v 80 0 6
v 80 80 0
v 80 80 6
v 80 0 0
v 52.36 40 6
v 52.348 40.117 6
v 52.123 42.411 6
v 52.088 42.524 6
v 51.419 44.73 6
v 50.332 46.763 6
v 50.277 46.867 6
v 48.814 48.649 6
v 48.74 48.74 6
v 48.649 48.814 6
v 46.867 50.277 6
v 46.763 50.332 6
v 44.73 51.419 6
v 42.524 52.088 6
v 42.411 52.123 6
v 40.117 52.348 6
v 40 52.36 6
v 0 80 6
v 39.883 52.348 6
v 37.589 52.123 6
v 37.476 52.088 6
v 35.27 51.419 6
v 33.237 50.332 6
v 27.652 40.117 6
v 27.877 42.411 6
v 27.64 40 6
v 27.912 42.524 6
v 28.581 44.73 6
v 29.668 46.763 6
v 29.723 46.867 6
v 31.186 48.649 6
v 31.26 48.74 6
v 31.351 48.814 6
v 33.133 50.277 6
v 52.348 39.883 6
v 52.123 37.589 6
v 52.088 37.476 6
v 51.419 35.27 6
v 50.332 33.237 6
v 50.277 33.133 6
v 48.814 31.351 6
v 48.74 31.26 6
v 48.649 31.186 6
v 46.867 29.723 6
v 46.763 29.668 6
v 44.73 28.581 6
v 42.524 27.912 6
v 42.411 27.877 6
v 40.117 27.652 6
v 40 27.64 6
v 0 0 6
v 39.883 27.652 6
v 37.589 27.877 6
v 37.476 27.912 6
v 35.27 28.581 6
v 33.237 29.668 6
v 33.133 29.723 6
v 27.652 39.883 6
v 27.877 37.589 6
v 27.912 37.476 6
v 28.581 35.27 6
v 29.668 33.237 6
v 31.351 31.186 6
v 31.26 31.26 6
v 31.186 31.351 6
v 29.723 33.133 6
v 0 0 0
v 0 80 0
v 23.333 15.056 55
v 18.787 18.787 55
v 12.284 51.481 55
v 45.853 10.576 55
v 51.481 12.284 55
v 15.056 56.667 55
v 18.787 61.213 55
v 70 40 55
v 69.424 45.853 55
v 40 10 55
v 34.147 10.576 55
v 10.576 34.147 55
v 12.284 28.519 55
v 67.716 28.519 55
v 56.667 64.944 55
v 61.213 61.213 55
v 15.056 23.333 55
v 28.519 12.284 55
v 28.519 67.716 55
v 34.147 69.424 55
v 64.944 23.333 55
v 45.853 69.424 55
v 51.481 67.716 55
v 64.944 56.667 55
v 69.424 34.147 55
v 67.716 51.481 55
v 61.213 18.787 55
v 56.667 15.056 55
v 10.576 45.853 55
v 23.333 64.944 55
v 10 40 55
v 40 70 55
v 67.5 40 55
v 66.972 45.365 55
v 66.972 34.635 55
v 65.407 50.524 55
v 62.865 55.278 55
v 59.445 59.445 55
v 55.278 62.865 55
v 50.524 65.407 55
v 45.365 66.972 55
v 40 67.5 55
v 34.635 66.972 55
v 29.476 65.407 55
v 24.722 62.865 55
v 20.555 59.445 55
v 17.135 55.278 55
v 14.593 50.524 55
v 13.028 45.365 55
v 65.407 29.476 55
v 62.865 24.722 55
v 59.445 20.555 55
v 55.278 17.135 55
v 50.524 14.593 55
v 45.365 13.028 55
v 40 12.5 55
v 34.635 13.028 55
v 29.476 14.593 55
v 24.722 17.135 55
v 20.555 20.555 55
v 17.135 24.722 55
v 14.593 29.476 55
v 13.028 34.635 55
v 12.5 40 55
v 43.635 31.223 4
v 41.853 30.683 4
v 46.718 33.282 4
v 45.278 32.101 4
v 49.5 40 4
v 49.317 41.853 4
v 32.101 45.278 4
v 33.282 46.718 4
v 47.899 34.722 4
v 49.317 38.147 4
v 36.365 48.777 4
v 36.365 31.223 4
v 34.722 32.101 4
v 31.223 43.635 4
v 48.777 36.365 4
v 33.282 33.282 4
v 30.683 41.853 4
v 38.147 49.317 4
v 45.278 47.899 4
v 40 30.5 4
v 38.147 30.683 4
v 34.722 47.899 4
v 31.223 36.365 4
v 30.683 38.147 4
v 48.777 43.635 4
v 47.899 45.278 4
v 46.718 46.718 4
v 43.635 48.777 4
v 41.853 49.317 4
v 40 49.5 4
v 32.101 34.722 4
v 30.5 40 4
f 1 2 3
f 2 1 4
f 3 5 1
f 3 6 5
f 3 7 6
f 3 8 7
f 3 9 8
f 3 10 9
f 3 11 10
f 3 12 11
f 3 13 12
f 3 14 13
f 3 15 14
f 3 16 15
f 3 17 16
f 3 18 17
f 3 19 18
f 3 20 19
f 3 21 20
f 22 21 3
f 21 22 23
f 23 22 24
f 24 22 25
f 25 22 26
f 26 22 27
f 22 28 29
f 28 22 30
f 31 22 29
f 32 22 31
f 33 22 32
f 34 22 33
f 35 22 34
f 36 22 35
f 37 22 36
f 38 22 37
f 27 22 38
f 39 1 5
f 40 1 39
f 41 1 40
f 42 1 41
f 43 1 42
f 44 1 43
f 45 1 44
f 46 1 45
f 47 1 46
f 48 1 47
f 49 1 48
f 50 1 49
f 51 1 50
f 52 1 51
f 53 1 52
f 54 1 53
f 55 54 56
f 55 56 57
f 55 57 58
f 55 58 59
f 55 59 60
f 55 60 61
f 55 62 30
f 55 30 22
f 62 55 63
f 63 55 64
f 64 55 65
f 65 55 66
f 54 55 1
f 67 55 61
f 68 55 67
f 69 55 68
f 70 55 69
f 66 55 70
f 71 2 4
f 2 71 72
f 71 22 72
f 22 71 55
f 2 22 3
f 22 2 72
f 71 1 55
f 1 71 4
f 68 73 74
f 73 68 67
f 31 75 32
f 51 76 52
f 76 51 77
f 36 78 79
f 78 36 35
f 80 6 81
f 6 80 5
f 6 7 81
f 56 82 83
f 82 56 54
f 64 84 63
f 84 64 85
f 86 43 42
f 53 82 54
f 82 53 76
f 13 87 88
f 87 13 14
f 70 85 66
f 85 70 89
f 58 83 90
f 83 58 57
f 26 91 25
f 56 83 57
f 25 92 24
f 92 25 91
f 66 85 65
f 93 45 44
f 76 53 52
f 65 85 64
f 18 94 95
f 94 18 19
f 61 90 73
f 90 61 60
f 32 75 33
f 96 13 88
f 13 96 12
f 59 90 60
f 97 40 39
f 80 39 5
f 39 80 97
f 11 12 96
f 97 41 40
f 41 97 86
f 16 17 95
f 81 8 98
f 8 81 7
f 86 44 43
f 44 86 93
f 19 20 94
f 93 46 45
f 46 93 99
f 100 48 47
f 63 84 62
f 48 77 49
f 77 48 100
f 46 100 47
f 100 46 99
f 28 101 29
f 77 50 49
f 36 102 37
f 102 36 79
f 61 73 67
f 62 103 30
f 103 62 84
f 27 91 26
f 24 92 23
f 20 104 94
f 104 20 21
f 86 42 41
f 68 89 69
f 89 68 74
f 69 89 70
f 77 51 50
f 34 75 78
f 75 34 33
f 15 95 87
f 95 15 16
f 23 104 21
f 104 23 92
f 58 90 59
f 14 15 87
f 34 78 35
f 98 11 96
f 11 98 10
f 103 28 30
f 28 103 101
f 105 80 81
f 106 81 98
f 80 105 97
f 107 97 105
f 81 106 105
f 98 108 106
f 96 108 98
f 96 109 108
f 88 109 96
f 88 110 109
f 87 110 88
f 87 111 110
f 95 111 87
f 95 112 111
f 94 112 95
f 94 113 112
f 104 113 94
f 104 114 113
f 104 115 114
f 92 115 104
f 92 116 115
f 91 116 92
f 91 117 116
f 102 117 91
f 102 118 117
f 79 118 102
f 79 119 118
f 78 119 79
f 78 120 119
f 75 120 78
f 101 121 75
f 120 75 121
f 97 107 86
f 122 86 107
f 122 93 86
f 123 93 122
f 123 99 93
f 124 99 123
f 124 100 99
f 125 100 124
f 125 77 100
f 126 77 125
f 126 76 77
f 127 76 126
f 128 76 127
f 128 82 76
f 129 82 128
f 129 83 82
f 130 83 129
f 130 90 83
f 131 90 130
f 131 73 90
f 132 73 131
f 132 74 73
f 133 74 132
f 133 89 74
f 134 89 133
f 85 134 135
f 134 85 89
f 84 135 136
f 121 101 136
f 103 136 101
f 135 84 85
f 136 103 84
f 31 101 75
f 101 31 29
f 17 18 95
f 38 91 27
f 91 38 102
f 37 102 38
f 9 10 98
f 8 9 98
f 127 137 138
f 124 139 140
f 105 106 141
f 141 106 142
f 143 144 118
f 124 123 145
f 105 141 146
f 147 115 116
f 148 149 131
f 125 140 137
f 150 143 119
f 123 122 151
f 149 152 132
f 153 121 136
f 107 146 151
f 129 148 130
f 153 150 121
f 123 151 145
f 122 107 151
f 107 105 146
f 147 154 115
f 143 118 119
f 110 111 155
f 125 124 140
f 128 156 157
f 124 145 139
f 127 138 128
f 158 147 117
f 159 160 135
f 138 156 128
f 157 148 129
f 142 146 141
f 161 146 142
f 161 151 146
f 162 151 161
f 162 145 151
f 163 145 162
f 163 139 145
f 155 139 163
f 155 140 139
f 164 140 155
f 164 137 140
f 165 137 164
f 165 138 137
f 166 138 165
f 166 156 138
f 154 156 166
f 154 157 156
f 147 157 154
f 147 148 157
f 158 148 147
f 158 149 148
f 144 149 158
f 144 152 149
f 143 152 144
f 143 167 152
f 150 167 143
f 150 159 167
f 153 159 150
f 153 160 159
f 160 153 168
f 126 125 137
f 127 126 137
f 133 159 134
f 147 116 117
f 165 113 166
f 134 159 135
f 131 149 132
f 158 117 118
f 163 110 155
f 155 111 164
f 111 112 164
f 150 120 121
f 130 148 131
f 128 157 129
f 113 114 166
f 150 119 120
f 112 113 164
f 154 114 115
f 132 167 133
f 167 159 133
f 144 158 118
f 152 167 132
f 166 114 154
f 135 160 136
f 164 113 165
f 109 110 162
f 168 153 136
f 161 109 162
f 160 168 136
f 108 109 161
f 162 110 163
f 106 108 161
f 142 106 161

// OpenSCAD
$fn = 32;

// ----------------------------------------------------------------------
// Hopper: funnel with square flange
// ----------------------------------------------------------------------

// --- parameters (mm) ---
fl = 80;                  // flange side, X and Y
fl_t = 6;                 // flange thickness
cone_h = 50;              // cone height above the flange
top_d = 60;               // cone mouth diameter
bot_d = 24;               // cone spout diameter
wall = 2.5;               // cone wall thickness
fit_tol = 0.02;           // tolerance for press fits, mm
free_tol = 0.2;           // tolerance for clearance fits, mm

bore_d = bot_d - 2 * wall;  // spout bore diameter
total_h = fl_t + cone_h - 1;  // overall height

difference() {
  union() {
    cube([fl, fl, fl_t]);
    translate([fl / 2, fl / 2, fl_t - 1])
      cylinder(h = cone_h, d1 = bot_d, d2 = top_d);
  }
  translate([fl / 2, fl / 2, fl_t - 2])
    cylinder(h = cone_h + 1, d1 = bore_d, d2 = top_d - 2 * wall);
}
